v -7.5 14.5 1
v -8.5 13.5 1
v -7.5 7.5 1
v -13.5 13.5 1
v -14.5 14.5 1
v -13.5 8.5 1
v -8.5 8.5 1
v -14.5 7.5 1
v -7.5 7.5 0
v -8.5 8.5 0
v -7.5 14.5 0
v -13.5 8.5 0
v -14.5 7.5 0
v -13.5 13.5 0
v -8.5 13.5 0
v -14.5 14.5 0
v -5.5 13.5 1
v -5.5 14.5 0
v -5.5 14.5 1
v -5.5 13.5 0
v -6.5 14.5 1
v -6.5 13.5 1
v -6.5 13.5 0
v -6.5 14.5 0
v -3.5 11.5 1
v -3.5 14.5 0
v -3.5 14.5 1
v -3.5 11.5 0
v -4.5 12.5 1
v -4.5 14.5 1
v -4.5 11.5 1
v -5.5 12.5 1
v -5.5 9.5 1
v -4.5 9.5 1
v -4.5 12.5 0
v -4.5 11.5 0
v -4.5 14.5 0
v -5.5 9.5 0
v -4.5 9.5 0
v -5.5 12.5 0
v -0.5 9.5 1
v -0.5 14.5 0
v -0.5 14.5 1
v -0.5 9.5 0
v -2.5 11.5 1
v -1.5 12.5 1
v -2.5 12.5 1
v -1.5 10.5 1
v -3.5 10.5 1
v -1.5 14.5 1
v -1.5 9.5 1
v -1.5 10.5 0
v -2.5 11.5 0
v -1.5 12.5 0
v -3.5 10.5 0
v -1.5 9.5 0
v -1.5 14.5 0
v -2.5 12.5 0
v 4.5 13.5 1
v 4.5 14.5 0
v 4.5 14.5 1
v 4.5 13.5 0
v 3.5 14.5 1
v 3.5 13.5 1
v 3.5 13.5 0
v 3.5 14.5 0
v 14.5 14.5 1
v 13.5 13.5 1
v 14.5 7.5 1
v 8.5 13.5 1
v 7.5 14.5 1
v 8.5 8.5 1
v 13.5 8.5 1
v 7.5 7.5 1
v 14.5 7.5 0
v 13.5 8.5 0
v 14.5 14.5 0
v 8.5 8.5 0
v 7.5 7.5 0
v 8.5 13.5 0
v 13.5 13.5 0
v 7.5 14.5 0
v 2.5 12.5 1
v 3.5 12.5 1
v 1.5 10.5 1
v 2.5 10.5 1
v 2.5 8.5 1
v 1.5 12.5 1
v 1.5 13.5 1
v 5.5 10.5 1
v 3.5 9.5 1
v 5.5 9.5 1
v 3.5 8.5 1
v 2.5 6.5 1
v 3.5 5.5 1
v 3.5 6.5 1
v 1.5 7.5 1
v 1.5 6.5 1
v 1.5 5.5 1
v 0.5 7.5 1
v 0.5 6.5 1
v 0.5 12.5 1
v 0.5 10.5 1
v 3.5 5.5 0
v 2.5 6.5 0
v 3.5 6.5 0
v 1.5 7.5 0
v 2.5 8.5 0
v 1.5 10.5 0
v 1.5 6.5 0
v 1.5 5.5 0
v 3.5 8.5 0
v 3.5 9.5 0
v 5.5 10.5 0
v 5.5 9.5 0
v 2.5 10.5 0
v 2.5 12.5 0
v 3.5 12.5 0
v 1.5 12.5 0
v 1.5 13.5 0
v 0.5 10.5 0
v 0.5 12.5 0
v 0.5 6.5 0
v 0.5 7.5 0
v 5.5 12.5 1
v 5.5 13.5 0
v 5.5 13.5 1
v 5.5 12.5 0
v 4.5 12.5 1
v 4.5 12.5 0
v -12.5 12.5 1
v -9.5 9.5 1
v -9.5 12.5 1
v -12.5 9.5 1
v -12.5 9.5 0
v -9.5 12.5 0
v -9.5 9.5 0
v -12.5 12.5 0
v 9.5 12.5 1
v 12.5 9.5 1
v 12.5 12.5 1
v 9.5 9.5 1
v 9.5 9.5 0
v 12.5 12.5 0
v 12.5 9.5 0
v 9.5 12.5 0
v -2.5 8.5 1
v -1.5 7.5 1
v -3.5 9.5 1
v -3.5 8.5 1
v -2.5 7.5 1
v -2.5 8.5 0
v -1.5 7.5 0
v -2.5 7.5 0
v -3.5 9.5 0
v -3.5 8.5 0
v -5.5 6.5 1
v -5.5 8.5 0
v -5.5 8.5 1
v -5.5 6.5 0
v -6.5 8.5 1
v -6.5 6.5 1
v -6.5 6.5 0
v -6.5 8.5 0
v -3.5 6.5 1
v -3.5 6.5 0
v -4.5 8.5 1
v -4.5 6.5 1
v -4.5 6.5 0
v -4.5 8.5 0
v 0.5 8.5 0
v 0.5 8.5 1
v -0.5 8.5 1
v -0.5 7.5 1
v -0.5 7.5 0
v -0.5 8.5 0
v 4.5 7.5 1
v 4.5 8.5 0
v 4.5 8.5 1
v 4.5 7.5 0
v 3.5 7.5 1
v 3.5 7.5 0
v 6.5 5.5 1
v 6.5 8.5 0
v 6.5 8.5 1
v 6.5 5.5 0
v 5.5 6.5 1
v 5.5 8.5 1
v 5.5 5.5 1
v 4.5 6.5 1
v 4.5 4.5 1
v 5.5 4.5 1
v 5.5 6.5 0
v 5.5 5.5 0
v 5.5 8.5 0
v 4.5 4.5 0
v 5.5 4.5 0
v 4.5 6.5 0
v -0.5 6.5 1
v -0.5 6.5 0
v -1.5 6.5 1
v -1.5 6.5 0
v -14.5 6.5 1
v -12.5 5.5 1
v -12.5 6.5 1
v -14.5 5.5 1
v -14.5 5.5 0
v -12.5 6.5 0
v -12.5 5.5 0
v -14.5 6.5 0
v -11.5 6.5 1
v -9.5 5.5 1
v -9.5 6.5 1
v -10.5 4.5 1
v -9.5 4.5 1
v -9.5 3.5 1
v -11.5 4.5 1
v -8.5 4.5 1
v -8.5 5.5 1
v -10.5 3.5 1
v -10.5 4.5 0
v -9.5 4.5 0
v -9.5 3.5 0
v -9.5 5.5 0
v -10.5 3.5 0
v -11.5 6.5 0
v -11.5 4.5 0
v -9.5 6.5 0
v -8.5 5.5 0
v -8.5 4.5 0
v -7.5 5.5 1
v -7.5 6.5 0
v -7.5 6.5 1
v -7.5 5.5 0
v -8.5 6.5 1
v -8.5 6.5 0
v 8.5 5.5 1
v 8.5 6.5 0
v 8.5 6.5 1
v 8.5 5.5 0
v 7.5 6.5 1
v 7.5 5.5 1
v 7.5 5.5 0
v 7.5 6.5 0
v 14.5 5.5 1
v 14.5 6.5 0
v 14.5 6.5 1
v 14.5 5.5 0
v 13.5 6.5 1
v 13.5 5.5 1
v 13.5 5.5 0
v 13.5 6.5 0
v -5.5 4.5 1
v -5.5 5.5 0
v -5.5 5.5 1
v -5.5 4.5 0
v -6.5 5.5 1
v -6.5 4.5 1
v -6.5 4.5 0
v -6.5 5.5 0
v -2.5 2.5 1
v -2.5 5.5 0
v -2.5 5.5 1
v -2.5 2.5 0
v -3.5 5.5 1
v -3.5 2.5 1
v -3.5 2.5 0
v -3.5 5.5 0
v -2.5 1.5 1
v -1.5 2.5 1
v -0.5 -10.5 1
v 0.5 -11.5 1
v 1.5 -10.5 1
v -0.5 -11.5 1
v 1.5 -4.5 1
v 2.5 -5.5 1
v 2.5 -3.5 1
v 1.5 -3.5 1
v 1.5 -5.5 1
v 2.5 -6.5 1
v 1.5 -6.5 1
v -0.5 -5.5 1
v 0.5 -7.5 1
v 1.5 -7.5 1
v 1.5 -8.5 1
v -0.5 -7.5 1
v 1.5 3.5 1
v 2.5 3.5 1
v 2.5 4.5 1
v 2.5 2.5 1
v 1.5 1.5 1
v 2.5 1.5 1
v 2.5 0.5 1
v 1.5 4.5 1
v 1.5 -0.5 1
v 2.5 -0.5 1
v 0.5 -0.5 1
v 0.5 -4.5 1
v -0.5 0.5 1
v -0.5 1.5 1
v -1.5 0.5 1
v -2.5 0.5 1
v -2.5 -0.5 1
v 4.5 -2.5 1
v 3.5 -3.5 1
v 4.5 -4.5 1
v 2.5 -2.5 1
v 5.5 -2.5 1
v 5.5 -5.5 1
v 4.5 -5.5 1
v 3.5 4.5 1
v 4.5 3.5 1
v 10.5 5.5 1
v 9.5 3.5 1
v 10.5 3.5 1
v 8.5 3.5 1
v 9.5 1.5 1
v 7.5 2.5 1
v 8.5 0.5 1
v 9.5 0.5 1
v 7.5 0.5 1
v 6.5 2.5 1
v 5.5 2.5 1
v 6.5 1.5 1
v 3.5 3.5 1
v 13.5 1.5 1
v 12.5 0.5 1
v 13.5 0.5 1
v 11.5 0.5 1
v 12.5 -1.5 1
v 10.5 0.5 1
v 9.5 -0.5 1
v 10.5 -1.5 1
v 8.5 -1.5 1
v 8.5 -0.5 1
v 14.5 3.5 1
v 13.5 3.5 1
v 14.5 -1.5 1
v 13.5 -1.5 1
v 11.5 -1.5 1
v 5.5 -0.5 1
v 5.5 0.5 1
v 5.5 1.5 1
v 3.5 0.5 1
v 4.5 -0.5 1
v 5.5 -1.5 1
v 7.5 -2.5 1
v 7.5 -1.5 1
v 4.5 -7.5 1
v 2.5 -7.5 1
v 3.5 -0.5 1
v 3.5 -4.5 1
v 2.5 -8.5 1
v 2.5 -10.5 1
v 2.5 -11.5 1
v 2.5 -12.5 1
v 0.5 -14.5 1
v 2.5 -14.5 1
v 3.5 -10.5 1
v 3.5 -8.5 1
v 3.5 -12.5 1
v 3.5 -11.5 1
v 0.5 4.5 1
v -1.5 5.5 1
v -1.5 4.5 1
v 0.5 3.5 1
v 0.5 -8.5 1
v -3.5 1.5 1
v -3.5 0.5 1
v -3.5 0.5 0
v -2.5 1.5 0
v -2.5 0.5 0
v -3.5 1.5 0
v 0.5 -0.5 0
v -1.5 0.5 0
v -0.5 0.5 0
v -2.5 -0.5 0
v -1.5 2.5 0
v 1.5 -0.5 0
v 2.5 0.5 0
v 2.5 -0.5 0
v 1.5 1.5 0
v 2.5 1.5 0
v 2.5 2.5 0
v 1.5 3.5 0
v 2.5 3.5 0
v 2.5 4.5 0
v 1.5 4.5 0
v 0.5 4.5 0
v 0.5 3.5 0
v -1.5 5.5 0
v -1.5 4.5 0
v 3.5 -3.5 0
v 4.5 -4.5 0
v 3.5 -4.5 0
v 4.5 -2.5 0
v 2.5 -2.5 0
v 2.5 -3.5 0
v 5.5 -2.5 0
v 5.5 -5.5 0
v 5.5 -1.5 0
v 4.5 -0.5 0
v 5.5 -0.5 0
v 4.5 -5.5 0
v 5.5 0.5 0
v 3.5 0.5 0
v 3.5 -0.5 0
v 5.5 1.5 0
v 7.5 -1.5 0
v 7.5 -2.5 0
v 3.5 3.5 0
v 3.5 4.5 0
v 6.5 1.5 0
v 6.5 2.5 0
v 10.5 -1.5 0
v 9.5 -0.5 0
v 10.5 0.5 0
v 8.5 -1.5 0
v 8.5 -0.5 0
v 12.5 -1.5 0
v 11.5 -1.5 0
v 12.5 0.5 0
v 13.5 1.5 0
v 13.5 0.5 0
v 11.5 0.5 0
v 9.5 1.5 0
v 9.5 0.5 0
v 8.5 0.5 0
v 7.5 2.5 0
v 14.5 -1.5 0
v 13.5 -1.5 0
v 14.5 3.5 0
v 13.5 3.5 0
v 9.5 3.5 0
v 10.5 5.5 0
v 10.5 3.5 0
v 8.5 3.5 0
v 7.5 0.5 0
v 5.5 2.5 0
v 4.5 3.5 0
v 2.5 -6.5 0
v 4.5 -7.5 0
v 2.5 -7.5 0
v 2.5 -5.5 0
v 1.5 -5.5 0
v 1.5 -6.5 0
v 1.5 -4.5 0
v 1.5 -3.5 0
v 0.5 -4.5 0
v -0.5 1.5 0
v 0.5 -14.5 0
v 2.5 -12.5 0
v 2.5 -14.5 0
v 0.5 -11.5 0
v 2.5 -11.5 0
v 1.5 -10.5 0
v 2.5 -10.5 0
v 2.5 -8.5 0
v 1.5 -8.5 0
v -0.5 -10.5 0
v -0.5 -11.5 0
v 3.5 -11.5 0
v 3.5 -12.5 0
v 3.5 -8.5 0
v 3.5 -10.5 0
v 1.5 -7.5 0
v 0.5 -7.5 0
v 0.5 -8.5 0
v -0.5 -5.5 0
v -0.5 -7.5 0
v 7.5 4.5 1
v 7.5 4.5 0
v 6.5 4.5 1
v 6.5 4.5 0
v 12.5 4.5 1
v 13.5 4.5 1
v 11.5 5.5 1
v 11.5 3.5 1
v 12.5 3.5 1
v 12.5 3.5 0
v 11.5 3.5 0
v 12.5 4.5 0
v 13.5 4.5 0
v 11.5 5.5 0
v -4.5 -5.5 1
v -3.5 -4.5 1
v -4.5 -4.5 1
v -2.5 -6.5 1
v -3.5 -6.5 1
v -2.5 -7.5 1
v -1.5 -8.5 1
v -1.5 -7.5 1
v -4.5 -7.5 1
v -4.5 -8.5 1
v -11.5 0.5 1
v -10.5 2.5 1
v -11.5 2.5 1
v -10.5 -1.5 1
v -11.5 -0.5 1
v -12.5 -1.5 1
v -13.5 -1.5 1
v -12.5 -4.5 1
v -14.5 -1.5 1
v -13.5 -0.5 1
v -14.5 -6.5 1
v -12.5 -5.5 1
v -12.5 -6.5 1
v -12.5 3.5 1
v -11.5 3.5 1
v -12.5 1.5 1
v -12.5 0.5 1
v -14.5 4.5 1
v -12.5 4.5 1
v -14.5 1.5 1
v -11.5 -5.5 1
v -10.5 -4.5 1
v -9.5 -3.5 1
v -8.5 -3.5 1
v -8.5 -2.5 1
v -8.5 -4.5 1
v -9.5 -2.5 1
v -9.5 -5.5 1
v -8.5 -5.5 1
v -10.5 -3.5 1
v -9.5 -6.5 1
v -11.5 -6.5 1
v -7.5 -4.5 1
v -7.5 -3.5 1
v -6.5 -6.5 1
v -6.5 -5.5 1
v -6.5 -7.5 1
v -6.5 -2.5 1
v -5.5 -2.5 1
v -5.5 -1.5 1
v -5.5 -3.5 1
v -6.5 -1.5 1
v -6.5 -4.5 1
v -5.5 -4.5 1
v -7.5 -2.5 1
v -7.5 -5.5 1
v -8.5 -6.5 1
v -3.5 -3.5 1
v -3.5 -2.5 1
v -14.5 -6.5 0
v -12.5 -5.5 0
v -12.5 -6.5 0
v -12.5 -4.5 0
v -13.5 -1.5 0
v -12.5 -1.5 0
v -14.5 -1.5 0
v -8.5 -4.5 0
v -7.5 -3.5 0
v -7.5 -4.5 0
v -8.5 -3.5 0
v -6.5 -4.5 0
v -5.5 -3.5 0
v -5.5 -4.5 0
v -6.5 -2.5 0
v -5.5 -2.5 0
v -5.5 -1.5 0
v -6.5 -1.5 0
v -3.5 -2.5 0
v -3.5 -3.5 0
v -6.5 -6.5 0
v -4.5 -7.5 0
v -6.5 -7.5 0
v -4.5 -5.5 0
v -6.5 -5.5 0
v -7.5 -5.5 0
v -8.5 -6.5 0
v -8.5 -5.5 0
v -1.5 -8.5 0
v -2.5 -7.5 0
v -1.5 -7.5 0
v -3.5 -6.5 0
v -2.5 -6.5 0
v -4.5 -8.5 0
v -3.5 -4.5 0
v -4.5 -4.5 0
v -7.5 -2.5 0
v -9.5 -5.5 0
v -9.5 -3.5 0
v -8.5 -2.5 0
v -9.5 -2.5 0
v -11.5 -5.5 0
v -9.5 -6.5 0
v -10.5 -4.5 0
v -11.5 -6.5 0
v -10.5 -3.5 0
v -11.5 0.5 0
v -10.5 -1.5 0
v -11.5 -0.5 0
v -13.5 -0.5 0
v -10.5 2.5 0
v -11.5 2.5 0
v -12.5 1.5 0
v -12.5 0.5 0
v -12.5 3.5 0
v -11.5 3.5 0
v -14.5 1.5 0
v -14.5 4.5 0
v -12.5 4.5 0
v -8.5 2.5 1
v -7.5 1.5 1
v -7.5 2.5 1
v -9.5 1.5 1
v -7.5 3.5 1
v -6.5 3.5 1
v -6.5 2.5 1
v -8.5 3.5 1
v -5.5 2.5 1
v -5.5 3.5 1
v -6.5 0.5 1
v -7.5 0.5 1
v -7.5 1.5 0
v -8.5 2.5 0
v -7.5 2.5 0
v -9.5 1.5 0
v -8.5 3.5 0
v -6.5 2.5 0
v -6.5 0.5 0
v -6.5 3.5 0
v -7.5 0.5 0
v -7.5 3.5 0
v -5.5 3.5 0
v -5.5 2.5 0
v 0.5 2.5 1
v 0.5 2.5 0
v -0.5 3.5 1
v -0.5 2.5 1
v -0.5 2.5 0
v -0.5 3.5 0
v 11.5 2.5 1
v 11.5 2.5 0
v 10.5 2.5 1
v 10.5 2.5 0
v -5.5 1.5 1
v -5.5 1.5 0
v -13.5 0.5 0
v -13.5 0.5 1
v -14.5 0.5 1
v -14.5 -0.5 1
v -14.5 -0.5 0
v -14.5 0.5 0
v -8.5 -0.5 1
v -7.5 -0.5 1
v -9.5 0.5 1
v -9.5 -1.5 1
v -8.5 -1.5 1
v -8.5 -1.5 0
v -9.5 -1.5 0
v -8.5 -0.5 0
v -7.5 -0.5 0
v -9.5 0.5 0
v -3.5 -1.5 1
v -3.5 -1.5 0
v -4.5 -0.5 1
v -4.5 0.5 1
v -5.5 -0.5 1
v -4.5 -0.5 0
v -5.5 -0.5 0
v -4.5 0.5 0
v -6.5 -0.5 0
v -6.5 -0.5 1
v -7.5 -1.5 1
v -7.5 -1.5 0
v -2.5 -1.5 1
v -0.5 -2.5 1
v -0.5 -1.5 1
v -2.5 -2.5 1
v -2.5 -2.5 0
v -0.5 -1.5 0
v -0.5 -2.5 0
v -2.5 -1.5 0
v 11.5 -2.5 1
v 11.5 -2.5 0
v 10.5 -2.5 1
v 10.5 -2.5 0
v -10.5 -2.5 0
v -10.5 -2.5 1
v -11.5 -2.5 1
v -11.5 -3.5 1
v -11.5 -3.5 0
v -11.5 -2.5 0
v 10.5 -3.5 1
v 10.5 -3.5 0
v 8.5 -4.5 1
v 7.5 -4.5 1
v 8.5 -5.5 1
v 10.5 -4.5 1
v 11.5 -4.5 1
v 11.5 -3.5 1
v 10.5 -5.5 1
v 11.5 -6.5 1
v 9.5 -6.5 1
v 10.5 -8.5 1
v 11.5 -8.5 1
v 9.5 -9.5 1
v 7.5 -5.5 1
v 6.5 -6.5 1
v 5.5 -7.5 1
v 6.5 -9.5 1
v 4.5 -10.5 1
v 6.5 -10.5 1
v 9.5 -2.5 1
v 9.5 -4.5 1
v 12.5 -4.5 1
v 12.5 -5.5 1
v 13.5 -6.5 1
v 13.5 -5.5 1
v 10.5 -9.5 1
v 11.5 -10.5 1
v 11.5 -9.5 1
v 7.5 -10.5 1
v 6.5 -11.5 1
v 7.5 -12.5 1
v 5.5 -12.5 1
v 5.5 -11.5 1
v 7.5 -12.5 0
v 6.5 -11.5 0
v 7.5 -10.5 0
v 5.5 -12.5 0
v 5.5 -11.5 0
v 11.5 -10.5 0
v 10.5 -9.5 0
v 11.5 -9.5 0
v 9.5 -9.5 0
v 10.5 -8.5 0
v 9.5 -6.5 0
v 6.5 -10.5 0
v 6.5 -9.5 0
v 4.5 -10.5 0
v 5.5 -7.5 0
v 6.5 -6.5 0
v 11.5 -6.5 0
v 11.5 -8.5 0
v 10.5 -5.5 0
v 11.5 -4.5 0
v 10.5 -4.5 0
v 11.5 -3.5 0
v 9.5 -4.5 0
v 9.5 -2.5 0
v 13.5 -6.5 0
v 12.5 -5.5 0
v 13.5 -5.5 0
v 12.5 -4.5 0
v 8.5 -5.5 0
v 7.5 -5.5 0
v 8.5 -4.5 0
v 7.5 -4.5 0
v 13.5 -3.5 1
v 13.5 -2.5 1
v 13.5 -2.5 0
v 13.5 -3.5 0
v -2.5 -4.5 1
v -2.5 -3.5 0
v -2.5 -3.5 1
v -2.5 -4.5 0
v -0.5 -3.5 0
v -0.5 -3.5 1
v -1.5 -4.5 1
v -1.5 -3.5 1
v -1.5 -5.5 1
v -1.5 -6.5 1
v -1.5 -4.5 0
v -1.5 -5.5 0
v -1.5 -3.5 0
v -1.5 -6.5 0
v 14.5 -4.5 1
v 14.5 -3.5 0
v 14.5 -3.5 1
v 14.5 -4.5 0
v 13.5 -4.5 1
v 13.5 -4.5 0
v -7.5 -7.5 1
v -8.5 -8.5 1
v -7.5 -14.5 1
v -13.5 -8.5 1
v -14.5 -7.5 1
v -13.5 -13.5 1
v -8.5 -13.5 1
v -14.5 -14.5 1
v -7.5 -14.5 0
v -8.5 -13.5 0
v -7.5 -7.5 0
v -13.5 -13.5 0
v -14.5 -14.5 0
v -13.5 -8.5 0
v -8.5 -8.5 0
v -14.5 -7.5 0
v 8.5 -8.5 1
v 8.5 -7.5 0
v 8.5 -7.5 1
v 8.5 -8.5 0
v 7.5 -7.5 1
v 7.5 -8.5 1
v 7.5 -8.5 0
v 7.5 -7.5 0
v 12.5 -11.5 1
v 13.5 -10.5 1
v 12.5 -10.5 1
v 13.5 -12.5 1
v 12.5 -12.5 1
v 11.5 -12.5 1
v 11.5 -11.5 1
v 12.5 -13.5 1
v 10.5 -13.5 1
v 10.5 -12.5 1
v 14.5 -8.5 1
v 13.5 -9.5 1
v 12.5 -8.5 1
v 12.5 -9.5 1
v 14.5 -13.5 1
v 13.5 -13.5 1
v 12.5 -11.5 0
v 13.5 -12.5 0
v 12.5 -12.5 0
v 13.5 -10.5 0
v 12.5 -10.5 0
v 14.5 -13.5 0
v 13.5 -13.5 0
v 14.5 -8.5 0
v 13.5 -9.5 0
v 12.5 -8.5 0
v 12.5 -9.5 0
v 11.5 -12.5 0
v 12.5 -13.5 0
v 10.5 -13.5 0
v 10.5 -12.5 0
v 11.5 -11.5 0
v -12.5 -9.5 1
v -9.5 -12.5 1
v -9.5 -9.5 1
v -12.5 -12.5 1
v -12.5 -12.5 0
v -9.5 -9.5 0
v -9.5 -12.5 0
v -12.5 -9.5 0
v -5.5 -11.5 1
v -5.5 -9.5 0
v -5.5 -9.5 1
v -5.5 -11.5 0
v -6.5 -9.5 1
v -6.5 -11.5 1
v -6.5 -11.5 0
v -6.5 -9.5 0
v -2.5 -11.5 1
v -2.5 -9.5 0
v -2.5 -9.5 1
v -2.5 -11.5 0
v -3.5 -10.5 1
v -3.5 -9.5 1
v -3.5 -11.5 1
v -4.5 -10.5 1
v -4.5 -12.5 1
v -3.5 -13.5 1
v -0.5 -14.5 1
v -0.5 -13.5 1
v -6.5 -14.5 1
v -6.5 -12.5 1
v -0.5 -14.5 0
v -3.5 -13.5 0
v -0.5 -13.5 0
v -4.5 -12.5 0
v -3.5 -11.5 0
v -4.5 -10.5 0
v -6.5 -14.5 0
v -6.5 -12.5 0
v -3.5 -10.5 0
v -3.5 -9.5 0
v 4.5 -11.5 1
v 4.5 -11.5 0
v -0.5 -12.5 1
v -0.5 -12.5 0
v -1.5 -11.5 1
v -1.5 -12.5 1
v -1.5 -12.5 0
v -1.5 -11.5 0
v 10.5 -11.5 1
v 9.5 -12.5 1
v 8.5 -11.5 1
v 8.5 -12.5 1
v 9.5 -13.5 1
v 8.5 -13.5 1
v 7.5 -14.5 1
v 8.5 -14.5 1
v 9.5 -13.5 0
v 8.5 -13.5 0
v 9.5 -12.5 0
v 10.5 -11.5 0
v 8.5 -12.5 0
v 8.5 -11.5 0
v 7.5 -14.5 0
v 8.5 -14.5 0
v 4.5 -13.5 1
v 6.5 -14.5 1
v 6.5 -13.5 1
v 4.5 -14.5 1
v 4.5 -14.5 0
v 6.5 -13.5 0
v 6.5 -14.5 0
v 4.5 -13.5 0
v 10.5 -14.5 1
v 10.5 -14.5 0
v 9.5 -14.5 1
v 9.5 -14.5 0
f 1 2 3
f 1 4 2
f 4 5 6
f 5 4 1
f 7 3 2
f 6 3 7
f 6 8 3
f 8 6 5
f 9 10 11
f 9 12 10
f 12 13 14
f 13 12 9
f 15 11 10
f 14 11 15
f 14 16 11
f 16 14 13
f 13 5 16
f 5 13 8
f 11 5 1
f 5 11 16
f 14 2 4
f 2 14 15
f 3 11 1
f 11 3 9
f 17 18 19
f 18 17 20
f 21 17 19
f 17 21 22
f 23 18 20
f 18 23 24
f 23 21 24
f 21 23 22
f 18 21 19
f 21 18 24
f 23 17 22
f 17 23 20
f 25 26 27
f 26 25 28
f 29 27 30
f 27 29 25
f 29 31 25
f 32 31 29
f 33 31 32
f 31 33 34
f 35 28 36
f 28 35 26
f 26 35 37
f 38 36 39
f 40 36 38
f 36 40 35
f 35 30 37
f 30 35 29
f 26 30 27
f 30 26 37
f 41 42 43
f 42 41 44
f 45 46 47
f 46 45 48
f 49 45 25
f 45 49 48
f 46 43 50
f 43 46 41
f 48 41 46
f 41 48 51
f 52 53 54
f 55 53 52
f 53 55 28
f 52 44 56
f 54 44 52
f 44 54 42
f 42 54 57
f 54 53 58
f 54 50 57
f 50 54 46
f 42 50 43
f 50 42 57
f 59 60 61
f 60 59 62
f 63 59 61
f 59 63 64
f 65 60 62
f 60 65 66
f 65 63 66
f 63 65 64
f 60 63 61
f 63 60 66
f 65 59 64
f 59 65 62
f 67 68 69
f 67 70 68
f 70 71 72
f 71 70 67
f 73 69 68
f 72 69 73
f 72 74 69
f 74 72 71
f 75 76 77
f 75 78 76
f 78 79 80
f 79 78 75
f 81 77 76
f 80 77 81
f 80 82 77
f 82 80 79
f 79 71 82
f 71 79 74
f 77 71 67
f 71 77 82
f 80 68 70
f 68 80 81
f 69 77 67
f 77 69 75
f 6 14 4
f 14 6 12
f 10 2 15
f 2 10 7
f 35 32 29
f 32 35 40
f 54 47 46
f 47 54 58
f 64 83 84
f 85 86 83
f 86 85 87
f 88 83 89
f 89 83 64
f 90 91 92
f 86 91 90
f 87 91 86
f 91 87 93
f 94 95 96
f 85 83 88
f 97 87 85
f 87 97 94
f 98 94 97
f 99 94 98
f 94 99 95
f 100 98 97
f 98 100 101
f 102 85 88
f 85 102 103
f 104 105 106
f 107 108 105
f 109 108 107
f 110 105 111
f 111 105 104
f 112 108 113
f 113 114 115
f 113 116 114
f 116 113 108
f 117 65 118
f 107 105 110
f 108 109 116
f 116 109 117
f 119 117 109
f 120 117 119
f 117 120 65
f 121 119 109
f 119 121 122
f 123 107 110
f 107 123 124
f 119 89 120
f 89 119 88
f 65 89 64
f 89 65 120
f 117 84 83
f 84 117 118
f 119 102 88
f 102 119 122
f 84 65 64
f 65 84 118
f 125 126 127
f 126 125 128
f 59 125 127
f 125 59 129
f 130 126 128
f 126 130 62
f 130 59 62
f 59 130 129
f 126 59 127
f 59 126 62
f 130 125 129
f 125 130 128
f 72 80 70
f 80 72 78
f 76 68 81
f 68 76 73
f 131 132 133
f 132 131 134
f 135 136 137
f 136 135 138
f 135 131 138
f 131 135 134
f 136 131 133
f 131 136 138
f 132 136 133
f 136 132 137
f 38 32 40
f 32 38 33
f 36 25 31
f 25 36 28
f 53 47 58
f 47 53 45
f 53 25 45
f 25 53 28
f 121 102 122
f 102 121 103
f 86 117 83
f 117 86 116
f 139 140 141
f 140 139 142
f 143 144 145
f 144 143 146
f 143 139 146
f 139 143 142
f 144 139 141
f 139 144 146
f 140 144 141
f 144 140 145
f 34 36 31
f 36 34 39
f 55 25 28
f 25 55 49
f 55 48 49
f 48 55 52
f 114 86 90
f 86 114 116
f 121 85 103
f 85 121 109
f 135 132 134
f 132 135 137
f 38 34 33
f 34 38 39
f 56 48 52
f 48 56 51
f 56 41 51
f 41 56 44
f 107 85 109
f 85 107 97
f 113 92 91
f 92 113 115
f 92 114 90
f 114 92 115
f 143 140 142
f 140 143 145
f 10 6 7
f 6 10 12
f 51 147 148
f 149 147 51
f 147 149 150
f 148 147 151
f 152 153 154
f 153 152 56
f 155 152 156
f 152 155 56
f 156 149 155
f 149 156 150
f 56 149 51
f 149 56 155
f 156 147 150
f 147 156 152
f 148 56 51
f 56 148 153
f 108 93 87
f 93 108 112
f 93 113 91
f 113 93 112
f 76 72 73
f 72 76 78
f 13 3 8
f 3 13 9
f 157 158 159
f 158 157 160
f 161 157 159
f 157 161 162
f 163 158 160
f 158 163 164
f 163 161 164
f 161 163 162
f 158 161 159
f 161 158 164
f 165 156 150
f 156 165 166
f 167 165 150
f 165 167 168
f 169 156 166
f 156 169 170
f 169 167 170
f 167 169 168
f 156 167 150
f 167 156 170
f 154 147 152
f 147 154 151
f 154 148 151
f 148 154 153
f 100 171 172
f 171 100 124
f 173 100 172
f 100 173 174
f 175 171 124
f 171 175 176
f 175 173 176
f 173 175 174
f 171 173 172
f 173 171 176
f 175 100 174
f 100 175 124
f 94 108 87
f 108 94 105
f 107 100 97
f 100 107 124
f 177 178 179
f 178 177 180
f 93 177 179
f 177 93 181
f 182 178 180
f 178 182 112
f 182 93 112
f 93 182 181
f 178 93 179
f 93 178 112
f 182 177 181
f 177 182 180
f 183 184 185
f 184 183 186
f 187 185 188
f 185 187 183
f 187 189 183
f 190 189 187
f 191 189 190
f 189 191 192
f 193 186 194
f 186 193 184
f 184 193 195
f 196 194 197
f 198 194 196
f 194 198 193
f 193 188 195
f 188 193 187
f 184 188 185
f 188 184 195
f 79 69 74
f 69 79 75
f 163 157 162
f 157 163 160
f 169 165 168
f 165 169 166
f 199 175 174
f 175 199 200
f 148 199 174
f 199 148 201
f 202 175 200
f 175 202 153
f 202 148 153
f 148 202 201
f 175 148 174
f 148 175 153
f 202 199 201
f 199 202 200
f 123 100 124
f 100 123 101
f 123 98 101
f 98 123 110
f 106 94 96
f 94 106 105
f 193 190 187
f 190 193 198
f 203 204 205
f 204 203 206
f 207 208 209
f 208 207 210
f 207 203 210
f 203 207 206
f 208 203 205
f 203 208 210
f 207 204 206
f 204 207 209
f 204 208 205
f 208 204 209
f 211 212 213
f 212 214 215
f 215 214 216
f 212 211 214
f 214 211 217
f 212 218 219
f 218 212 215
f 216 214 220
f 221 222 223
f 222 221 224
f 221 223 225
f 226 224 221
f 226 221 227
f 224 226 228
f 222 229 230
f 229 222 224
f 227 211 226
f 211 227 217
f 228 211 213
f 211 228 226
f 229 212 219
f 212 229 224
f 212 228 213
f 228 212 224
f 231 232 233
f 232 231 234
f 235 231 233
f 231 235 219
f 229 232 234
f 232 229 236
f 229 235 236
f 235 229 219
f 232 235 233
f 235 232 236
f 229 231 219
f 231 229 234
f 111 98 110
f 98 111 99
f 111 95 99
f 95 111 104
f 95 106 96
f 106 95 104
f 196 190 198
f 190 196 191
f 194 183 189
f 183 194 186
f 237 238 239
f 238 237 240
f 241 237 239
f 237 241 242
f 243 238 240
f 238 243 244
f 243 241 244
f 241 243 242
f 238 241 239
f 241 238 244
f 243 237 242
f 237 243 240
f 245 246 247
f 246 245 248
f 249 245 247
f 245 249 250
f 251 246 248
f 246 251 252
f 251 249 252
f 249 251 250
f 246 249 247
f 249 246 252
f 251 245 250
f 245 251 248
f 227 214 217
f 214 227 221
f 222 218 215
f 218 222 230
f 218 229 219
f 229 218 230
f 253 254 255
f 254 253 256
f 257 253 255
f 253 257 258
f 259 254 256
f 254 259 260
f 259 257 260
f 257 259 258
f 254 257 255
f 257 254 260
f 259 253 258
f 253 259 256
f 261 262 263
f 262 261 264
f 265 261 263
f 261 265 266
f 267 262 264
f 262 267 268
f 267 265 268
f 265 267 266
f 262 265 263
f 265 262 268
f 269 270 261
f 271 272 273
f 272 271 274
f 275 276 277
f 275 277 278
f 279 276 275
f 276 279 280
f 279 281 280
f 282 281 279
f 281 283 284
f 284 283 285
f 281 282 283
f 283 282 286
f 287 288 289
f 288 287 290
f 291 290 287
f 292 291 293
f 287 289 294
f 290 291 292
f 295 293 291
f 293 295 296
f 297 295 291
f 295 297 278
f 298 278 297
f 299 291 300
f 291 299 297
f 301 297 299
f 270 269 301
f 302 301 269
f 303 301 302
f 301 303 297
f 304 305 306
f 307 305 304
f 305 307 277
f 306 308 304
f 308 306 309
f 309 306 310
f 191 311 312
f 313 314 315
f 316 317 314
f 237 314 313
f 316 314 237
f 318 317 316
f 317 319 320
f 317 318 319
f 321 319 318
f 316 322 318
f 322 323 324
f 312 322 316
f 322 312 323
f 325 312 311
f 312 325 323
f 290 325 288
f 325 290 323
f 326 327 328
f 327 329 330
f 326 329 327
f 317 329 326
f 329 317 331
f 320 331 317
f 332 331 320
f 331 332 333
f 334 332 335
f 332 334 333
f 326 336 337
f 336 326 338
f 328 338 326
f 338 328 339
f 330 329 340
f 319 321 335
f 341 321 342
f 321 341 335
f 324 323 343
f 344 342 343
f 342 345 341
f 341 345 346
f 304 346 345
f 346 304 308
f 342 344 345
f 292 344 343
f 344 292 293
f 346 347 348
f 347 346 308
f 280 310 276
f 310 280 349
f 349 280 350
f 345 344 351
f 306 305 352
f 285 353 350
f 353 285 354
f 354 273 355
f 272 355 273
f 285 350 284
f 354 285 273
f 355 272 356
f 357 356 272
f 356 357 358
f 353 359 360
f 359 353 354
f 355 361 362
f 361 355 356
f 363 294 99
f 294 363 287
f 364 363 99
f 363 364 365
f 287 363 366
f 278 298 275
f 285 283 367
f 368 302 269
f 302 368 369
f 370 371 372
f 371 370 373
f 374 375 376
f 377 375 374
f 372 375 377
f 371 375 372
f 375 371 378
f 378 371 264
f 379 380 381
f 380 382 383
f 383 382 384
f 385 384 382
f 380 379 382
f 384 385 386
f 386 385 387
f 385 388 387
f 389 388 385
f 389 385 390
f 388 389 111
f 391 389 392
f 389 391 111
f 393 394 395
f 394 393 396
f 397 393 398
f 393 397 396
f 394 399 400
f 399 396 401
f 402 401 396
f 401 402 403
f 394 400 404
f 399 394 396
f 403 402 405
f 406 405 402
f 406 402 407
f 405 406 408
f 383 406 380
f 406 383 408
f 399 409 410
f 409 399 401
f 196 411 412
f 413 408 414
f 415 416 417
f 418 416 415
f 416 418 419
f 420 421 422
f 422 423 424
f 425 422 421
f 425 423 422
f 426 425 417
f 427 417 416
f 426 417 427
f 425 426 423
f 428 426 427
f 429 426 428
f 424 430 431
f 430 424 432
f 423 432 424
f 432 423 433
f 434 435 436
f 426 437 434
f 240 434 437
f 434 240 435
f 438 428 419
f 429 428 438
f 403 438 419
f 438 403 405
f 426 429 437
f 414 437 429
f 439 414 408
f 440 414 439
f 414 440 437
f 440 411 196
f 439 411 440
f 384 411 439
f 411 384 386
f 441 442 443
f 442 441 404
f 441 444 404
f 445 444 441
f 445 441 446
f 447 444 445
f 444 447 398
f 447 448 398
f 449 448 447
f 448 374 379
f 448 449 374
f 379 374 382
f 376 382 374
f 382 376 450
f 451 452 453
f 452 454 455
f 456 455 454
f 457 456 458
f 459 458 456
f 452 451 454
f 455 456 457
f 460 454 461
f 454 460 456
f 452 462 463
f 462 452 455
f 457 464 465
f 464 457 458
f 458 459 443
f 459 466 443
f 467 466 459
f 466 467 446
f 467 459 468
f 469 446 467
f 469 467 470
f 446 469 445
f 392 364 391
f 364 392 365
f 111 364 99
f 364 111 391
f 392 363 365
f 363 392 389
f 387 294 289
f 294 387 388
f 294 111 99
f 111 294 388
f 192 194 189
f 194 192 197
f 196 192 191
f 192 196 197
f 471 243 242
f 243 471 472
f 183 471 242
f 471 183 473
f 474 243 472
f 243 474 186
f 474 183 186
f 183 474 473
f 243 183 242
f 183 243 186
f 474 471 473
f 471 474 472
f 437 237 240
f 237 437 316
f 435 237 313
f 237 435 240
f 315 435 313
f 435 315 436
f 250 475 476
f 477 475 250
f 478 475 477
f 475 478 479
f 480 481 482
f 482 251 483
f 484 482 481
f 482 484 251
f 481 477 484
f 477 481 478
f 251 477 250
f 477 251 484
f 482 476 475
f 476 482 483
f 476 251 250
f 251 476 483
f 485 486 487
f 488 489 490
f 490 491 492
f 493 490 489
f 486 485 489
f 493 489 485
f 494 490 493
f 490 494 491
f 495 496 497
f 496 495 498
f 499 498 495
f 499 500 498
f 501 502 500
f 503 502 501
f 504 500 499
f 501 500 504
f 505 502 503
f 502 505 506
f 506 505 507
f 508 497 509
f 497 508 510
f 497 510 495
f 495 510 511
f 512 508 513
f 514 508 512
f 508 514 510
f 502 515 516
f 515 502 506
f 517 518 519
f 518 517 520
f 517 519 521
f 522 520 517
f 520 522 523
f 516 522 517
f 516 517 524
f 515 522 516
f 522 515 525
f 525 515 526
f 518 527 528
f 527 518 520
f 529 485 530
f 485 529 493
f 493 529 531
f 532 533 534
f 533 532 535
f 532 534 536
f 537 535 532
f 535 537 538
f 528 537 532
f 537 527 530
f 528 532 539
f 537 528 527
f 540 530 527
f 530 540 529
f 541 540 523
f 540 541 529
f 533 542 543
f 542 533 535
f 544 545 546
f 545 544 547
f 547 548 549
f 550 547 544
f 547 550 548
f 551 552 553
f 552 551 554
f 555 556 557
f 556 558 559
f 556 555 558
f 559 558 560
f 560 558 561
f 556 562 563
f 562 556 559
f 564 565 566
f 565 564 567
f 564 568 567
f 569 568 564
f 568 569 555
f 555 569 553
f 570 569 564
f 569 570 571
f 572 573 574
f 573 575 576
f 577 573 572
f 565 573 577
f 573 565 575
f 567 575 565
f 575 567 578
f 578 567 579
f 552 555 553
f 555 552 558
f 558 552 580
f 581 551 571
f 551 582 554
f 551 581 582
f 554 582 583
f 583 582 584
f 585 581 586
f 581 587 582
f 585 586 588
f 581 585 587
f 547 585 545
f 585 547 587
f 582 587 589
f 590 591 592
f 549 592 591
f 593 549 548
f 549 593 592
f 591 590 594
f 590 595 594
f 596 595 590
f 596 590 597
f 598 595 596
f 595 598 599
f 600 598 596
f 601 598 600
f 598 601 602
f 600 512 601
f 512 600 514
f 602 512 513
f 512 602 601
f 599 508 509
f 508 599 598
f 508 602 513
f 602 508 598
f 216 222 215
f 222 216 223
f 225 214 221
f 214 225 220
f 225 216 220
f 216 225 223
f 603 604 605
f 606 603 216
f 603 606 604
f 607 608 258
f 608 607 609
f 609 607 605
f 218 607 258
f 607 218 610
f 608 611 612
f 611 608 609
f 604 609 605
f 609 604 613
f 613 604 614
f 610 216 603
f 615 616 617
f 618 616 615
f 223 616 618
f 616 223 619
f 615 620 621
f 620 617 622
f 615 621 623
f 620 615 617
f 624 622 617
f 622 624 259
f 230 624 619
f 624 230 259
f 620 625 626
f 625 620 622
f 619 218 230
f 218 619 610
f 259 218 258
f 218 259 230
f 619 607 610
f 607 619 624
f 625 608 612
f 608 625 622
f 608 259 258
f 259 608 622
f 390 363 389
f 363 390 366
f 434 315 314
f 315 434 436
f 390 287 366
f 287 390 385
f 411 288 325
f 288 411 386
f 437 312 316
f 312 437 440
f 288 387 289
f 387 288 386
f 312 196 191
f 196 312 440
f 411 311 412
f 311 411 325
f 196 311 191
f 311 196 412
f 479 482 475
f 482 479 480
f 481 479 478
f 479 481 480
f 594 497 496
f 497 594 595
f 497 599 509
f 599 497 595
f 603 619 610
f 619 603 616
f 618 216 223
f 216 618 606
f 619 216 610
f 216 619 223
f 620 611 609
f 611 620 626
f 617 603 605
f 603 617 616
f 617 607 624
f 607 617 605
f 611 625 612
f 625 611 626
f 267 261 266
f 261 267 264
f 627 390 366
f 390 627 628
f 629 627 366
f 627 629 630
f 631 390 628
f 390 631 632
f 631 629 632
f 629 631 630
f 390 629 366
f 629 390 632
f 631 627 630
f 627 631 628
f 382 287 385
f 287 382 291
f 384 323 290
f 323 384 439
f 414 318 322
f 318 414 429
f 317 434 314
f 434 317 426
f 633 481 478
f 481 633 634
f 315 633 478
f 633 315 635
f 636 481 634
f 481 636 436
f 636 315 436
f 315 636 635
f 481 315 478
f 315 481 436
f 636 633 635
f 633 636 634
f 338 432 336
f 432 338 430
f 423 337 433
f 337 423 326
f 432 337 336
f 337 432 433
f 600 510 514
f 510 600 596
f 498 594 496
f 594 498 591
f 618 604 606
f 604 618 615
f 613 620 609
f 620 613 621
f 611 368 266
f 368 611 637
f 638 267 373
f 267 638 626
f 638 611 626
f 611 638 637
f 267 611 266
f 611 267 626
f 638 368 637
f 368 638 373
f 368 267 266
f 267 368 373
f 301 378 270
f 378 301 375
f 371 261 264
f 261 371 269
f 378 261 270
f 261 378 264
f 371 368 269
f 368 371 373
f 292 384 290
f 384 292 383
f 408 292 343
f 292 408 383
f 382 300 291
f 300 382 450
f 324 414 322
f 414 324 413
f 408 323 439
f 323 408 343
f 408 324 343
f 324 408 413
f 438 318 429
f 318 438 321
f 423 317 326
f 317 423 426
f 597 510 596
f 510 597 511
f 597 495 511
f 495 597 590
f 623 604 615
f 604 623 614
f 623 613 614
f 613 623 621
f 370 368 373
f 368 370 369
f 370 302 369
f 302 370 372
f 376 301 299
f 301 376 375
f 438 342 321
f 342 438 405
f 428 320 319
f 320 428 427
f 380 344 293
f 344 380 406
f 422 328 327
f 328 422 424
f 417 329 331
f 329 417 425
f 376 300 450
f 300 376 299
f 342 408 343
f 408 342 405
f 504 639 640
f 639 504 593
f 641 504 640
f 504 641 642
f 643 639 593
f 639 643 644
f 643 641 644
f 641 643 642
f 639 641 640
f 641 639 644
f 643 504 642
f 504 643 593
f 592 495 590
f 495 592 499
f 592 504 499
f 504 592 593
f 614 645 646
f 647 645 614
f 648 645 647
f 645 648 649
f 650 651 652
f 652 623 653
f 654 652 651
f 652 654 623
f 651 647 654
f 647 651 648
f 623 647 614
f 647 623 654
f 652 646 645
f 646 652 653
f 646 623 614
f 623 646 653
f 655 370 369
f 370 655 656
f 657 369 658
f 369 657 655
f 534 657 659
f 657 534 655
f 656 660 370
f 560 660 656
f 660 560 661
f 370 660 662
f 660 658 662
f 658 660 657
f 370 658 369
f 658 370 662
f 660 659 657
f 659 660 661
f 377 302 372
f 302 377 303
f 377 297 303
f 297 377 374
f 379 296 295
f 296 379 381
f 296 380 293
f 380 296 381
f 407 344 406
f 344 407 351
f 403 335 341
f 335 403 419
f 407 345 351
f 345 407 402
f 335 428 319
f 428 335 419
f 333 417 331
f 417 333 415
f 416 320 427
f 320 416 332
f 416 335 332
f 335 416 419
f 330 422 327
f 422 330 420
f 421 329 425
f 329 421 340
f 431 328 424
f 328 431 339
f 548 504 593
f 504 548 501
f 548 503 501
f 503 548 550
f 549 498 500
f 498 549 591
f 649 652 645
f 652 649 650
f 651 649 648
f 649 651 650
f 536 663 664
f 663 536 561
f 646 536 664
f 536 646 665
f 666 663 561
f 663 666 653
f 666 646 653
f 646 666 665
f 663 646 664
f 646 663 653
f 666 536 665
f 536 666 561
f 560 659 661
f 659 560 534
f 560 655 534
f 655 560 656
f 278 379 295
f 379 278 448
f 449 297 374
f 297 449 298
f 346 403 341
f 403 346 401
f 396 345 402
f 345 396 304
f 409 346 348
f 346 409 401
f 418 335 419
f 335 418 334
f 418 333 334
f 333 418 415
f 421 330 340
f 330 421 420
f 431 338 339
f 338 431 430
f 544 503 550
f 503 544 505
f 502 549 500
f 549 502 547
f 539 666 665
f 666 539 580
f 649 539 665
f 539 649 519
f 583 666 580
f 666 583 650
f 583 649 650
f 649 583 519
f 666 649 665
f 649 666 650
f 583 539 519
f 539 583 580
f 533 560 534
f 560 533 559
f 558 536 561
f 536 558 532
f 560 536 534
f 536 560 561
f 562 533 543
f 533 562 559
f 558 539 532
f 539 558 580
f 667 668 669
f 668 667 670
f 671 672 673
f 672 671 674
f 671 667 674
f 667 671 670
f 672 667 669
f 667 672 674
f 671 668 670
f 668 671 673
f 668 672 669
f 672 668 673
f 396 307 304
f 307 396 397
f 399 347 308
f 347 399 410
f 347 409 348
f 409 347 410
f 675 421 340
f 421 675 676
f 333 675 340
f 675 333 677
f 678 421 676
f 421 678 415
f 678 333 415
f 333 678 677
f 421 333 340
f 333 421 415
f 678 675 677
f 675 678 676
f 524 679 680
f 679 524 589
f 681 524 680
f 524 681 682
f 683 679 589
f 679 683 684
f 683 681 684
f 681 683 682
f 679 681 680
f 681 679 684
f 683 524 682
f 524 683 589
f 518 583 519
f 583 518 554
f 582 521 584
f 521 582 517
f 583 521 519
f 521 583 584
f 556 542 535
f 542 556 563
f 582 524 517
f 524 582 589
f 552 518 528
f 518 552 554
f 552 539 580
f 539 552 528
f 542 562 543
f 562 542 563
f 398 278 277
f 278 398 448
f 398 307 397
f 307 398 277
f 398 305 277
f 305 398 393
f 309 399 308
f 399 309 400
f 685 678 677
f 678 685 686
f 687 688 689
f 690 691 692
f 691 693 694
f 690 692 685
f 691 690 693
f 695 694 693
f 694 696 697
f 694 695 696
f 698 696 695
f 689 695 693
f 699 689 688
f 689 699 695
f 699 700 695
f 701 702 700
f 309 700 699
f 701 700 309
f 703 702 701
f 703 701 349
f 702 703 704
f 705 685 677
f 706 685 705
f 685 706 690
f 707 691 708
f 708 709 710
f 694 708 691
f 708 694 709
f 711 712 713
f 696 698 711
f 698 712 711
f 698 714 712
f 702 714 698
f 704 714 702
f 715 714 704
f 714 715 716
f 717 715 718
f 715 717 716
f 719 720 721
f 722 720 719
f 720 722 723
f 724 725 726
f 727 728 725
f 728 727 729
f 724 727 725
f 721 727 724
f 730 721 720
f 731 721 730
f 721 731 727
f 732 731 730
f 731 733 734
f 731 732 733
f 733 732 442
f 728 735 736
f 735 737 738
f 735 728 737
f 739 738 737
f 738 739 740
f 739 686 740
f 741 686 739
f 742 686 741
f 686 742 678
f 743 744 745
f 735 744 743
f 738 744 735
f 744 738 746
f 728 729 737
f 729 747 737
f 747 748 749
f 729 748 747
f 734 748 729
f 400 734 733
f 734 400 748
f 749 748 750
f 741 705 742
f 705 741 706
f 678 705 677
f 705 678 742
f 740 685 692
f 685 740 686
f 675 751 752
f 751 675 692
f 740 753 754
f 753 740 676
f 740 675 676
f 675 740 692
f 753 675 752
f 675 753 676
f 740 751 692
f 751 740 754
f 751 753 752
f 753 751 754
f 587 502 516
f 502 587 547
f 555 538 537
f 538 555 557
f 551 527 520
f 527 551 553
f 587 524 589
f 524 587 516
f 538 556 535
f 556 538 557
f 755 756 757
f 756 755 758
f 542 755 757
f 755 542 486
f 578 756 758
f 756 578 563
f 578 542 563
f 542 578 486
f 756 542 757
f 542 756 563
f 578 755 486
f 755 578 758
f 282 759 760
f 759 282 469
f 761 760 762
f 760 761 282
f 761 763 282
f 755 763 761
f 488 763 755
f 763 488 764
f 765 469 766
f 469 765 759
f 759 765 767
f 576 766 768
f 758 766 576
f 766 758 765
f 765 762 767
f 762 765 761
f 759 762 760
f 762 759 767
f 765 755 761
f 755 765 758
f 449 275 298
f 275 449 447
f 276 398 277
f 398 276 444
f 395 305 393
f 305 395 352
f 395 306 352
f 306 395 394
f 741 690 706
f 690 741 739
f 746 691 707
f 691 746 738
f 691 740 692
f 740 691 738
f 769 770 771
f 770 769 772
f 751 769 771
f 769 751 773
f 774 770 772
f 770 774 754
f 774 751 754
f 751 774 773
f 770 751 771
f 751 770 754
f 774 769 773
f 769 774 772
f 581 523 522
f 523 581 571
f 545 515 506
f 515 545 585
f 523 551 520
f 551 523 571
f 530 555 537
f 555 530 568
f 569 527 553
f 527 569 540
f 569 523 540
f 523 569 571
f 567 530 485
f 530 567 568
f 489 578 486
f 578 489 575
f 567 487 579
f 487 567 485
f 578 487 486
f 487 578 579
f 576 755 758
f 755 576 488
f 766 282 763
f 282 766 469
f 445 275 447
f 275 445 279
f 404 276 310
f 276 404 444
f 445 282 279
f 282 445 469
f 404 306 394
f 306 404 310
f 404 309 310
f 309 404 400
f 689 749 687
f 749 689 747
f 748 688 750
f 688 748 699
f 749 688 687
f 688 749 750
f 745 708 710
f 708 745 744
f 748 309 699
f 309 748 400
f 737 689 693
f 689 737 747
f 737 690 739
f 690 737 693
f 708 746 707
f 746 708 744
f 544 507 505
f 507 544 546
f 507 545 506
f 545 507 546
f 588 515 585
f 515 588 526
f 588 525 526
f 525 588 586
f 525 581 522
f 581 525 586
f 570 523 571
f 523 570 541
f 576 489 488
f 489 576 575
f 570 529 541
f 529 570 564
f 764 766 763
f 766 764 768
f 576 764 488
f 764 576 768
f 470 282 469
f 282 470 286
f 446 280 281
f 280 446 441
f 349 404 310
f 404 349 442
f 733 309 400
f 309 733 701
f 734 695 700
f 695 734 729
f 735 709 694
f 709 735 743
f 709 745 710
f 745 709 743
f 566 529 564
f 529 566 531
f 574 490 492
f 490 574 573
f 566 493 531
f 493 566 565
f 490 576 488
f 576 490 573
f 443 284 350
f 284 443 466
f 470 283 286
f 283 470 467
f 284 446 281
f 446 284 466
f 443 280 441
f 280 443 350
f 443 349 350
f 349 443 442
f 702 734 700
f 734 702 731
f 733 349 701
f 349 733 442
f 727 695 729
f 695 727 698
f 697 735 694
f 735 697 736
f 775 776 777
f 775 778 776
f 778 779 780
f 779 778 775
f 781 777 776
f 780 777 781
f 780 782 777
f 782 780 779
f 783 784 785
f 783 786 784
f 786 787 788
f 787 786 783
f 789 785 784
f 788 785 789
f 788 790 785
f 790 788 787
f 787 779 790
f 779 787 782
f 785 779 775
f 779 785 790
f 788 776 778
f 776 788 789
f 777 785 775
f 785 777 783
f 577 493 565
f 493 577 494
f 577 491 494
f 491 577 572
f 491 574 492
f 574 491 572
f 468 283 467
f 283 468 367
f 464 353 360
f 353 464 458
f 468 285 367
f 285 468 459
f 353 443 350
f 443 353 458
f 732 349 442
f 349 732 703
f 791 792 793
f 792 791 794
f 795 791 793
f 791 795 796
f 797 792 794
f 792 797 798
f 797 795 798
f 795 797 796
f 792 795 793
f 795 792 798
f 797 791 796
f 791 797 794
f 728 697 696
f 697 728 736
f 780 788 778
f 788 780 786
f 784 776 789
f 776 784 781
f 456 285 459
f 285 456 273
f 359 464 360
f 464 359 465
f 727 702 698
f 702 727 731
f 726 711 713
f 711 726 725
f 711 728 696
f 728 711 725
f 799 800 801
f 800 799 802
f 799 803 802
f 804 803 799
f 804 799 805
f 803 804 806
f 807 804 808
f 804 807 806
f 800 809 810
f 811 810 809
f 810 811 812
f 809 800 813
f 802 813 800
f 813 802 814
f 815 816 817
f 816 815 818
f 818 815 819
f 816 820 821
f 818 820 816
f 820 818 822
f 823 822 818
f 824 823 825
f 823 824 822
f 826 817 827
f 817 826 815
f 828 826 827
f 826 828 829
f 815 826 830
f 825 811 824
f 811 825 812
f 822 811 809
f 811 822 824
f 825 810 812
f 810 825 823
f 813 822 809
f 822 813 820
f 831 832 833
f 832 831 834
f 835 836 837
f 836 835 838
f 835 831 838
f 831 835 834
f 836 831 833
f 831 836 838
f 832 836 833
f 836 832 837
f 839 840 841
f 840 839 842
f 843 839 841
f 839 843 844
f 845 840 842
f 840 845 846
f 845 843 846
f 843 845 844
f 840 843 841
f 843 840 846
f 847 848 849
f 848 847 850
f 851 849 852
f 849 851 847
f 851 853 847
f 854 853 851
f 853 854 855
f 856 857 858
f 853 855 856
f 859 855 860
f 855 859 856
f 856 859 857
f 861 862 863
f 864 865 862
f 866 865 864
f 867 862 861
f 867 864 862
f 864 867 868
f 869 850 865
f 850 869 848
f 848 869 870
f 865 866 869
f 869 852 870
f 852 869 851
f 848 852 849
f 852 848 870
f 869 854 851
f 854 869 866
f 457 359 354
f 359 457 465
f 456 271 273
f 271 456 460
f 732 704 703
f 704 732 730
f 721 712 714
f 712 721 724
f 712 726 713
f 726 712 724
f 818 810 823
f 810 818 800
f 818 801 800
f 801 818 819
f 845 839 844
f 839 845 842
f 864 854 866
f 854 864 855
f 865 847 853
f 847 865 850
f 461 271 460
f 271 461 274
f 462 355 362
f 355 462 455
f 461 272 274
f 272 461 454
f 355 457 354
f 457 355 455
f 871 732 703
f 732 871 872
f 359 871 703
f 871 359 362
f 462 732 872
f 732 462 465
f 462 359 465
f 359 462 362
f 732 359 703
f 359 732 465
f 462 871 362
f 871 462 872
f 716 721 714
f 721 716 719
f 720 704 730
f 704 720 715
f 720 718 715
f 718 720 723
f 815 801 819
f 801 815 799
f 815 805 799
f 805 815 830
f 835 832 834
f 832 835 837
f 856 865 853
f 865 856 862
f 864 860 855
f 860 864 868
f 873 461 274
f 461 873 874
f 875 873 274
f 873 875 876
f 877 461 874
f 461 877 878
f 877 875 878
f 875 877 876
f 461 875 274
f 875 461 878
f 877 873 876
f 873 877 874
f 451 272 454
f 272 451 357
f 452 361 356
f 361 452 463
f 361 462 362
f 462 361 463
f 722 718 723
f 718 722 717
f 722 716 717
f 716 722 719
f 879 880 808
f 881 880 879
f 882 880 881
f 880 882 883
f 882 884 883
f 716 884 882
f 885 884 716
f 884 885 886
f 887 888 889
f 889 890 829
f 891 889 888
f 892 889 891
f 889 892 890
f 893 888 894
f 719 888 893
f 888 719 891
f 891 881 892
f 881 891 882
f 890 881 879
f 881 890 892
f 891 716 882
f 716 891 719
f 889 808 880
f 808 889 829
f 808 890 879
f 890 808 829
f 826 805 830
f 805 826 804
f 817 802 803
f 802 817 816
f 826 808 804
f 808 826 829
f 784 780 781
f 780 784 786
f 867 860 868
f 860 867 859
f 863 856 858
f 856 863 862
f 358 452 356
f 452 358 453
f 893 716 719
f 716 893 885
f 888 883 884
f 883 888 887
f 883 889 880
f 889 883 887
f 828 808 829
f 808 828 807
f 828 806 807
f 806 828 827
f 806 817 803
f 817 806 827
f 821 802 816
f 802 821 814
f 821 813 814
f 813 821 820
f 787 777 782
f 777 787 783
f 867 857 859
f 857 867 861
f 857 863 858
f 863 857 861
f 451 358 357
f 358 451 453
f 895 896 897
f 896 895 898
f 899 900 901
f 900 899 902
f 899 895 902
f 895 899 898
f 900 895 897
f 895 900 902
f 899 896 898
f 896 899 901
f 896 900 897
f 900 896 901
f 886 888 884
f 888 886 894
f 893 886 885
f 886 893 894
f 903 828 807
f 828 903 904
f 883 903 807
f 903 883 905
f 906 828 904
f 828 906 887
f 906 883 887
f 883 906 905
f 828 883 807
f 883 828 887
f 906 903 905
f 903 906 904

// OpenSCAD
// file: qr_code.scad
// QR code data for "https://github.com/OrsoEric/Gridfinity-medieval-tiles" (29 x 29)
// Generated by Altair's OpenSCAD QR Code Generator
// https://ridercz.github.io/OpenSCAD-QR/

// QR code rendering method
module qr_render
(
	data,
	iw_pixel_size = 1,
	iz_height = 1,
	//Print the negative of the code
	ib_negate = false
)
{
    maxmod = len(data) - 1;
	translate([-(maxmod+1)*iw_pixel_size/2,-(maxmod+1)*iw_pixel_size/2,0])
    union()
	{
        for (r = [0 : maxmod])
		{
            for (c = [0 : maxmod])
			{
                if (data[r][c] == (ib_negate?0:1))
				{
                    xo = c * iw_pixel_size;
                    yo = (maxmod - r) * iw_pixel_size;
                    translate([xo, yo, 0])
					cube([iw_pixel_size, iw_pixel_size, iz_height]);
                }
            }
        }
    }
}
// file: tile_constants.scad
//------------------------------------------------------------------------------
//	GRIDFINITY CONSTANTS
//------------------------------------------------------------------------------

//Spacing between tiles
gw_gridfinity_spacing = 42.0;
//width of a gridfinity tile
gw_gridfinity = 41.5;
gw_gridfinity_half_pitch = gw_gridfinity/2;

//height above which I can put geometry without interfering with the gridfinity socket
gz_gridfinity_socket_offset = 5;

//Rounding radious of the corners
gr_corner_terrain_rounding = 3.75;

//------------------------------------------------------------------------------
//	GRASS CONSTANTS
//------------------------------------------------------------------------------
//Constants for generating default grass terrain used in most tiles

//Maximum height at which grass will be found
gz_grass_top_height = 11.5;
//Do not let grass be lower than this, below there is the geometry of the tile
gz_grass_base = 2.5;
//Height of flat grass tiles
gz_grass_flat = gz_grass_top_height -gz_gridfinity_socket_offset;
//Maximum height consistency of flat grass tiles
gn_grass_flat_consistency = 0.9;

//------------------------------------------------------------------------------
//	SAND CONSTANTS
//------------------------------------------------------------------------------
//	taller smoother than grass

gz_sand_top_height = 13;
gz_sand_height = gz_sand_top_height -gz_gridfinity_socket_offset;

//------------------------------------------------------------------------------
//	HILL CONSTANTS
//------------------------------------------------------------------------------
//Constant for generating hill terrain. Used for CHURCH Tile

gz_grass_hill_top_height = 14;
gz_grass_hill_height = gz_grass_hill_top_height -gz_gridfinity_socket_offset;
gn_grass_hill_consistency = 0.9;
gz_grass_hill_random = 4;

//------------------------------------------------------------------------------
//	ROAD CONSTANTS
//------------------------------------------------------------------------------

//the road reaches up to this height
gz_road_top_height = 14;
//the road digs inside the model by this height
gz_road_height = 7;
//Width of the road
gw_road_width = 7;
//The road is indented to make for guardrails
gw_road_indent = 1.5;
gz_road_indent = 1;

//------------------------------------------------------------------------------
//	BRIDGE CONSTANTS
//------------------------------------------------------------------------------
// Bridges are roads that arch upward

//vertical thickness of the bridge
gz_bridge_height = 5;
//How tall the hump raises above the corners of the bridge
gz_bridge_hump = 6;

//------------------------------------------------------------------------------
//	CITY CONSTANTS
//------------------------------------------------------------------------------

gw_wall_width = 4;
gw_wall_indent = 1.5;
//Top Z of the wall
gz_wall_top_height = 22;
//Height of the wall
gz_wall_height = 16;
//How tall the towers stands above the walls
gz_short_tower_above_wall=8;
gz_tall_tower_above_wall=20;
//Base of the city
gz_plaza_top_height = 18;

//------------------------------------------------------------------------------
//	RIVER CONSTANTS
//------------------------------------------------------------------------------

//Create flat water at this height. it's where I stop using BLUE
gz_water_top_height = 6;
//Top height of the grass sorrounding the river banks
gz_grass_river_top_height = 16;
gz_grass_river_height = gz_grass_river_top_height -gz_gridfinity_socket_offset;
//Randomness of the terrain
gz_grass_river_roughness = 20;

//------------------------------------------------------------------------------
//	QR CODE
//------------------------------------------------------------------------------
// QR code data for "https://github.com/OrsoEric/Gridfinity-medieval-tiles" (29 x 29)
// Generated by Altair's OpenSCAD QR Code Generator
// https://ridercz.github.io/OpenSCAD-QR/
gnn_qr_data = [
	[1,1,1,1,1,1,1,0,1,0,1,0,0,1,0,0,0,0,1,0,0,0,1,1,1,1,1,1,1],
	[1,0,0,0,0,0,1,0,0,0,1,0,0,1,0,0,1,1,0,1,0,0,1,0,0,0,0,0,1],
	[1,0,1,1,1,0,1,0,0,1,1,0,1,1,0,1,1,0,0,0,0,0,1,0,1,1,1,0,1],
	[1,0,1,1,1,0,1,0,0,1,0,1,1,1,0,1,1,0,0,0,0,0,1,0,1,1,1,0,1],
	[1,0,1,1,1,0,1,0,0,1,0,0,0,1,0,0,1,1,1,1,0,0,1,0,1,1,1,0,1],
	[1,0,0,0,0,0,1,0,0,0,0,1,1,0,0,0,1,1,0,0,0,0,1,0,0,0,0,0,1],
	[1,1,1,1,1,1,1,0,1,0,1,0,1,0,1,0,1,0,1,0,1,0,1,1,1,1,1,1,1],
	[0,0,0,0,0,0,0,0,1,0,1,0,0,1,0,1,1,0,0,0,1,0,0,0,0,0,0,0,0],
	[1,1,0,1,1,0,1,0,0,0,0,0,0,0,0,0,1,1,0,1,1,0,1,0,0,0,0,0,1],
	[0,0,0,1,1,1,0,0,1,0,0,1,0,1,1,1,0,0,0,1,0,1,0,1,1,0,1,1,0],
	[1,1,0,0,1,0,1,1,0,0,0,1,0,0,0,1,1,0,1,0,0,0,0,1,1,0,1,0,0],
	[1,1,1,0,0,1,0,1,1,0,0,1,0,0,1,0,1,1,1,1,1,1,1,1,0,1,0,0,1],
	[1,1,1,1,0,1,1,1,0,1,1,0,1,0,0,0,1,0,0,0,1,0,1,1,0,0,0,0,1],
	[0,0,1,1,0,0,0,1,0,0,0,1,1,0,1,1,1,1,1,1,0,0,1,1,1,1,1,1,1],
	[1,0,0,1,0,1,1,0,0,0,1,0,1,1,1,1,1,0,1,1,1,1,1,0,1,0,1,0,1],
	[0,1,1,1,0,1,0,1,0,1,1,0,0,0,0,1,0,0,0,1,0,0,0,1,1,0,1,0,1],
	[1,1,0,0,0,0,1,0,1,0,0,0,1,1,0,1,0,0,0,1,1,1,0,0,0,1,0,0,0],
	[1,1,0,1,0,1,0,1,1,1,1,0,0,0,0,1,0,1,1,1,0,0,0,0,1,0,1,1,0],
	[1,1,0,0,1,1,1,1,1,0,0,1,0,1,0,1,1,0,1,1,0,0,0,0,1,1,0,0,1],
	[1,1,1,1,1,1,0,1,0,0,1,0,1,1,0,0,1,0,0,1,0,0,1,0,0,1,1,0,0],
	[1,1,0,1,1,0,1,1,1,1,1,0,1,0,1,1,1,1,1,0,1,1,1,1,1,1,1,1,0],
	[0,0,0,0,0,0,0,0,1,1,1,1,0,0,1,1,0,1,1,0,1,0,0,0,1,1,0,0,0],
	[1,1,1,1,1,1,1,0,0,0,1,1,1,0,0,1,1,0,0,1,1,0,1,0,1,1,0,0,0],
	[1,0,0,0,0,0,1,0,0,0,0,0,0,0,0,0,1,1,0,1,1,0,0,0,1,0,0,1,1],
	[1,0,1,1,1,0,1,0,1,0,0,1,0,0,0,0,1,1,0,1,1,1,1,1,1,1,0,0,1],
	[1,0,1,1,1,0,1,0,1,0,1,1,0,0,1,1,1,0,1,0,0,1,0,0,0,0,0,1,1],
	[1,0,1,1,1,0,1,0,0,0,1,0,0,1,0,1,1,1,0,0,1,1,0,1,1,0,1,1,1],
	[1,0,0,0,0,0,1,0,1,1,1,0,0,0,0,1,1,0,0,0,0,0,1,1,0,1,1,0,1],
	[1,1,1,1,1,1,1,0,1,1,1,1,1,1,0,1,1,0,0,1,1,0,1,0,1,0,0,0,0]
];
// main file
include <tile_constants.scad>

include <qr_code.scad>

qr_render(gnn_qr_data, ib_negate = false);
//qr_render(gnn_qr_data, ib_negate = true);
